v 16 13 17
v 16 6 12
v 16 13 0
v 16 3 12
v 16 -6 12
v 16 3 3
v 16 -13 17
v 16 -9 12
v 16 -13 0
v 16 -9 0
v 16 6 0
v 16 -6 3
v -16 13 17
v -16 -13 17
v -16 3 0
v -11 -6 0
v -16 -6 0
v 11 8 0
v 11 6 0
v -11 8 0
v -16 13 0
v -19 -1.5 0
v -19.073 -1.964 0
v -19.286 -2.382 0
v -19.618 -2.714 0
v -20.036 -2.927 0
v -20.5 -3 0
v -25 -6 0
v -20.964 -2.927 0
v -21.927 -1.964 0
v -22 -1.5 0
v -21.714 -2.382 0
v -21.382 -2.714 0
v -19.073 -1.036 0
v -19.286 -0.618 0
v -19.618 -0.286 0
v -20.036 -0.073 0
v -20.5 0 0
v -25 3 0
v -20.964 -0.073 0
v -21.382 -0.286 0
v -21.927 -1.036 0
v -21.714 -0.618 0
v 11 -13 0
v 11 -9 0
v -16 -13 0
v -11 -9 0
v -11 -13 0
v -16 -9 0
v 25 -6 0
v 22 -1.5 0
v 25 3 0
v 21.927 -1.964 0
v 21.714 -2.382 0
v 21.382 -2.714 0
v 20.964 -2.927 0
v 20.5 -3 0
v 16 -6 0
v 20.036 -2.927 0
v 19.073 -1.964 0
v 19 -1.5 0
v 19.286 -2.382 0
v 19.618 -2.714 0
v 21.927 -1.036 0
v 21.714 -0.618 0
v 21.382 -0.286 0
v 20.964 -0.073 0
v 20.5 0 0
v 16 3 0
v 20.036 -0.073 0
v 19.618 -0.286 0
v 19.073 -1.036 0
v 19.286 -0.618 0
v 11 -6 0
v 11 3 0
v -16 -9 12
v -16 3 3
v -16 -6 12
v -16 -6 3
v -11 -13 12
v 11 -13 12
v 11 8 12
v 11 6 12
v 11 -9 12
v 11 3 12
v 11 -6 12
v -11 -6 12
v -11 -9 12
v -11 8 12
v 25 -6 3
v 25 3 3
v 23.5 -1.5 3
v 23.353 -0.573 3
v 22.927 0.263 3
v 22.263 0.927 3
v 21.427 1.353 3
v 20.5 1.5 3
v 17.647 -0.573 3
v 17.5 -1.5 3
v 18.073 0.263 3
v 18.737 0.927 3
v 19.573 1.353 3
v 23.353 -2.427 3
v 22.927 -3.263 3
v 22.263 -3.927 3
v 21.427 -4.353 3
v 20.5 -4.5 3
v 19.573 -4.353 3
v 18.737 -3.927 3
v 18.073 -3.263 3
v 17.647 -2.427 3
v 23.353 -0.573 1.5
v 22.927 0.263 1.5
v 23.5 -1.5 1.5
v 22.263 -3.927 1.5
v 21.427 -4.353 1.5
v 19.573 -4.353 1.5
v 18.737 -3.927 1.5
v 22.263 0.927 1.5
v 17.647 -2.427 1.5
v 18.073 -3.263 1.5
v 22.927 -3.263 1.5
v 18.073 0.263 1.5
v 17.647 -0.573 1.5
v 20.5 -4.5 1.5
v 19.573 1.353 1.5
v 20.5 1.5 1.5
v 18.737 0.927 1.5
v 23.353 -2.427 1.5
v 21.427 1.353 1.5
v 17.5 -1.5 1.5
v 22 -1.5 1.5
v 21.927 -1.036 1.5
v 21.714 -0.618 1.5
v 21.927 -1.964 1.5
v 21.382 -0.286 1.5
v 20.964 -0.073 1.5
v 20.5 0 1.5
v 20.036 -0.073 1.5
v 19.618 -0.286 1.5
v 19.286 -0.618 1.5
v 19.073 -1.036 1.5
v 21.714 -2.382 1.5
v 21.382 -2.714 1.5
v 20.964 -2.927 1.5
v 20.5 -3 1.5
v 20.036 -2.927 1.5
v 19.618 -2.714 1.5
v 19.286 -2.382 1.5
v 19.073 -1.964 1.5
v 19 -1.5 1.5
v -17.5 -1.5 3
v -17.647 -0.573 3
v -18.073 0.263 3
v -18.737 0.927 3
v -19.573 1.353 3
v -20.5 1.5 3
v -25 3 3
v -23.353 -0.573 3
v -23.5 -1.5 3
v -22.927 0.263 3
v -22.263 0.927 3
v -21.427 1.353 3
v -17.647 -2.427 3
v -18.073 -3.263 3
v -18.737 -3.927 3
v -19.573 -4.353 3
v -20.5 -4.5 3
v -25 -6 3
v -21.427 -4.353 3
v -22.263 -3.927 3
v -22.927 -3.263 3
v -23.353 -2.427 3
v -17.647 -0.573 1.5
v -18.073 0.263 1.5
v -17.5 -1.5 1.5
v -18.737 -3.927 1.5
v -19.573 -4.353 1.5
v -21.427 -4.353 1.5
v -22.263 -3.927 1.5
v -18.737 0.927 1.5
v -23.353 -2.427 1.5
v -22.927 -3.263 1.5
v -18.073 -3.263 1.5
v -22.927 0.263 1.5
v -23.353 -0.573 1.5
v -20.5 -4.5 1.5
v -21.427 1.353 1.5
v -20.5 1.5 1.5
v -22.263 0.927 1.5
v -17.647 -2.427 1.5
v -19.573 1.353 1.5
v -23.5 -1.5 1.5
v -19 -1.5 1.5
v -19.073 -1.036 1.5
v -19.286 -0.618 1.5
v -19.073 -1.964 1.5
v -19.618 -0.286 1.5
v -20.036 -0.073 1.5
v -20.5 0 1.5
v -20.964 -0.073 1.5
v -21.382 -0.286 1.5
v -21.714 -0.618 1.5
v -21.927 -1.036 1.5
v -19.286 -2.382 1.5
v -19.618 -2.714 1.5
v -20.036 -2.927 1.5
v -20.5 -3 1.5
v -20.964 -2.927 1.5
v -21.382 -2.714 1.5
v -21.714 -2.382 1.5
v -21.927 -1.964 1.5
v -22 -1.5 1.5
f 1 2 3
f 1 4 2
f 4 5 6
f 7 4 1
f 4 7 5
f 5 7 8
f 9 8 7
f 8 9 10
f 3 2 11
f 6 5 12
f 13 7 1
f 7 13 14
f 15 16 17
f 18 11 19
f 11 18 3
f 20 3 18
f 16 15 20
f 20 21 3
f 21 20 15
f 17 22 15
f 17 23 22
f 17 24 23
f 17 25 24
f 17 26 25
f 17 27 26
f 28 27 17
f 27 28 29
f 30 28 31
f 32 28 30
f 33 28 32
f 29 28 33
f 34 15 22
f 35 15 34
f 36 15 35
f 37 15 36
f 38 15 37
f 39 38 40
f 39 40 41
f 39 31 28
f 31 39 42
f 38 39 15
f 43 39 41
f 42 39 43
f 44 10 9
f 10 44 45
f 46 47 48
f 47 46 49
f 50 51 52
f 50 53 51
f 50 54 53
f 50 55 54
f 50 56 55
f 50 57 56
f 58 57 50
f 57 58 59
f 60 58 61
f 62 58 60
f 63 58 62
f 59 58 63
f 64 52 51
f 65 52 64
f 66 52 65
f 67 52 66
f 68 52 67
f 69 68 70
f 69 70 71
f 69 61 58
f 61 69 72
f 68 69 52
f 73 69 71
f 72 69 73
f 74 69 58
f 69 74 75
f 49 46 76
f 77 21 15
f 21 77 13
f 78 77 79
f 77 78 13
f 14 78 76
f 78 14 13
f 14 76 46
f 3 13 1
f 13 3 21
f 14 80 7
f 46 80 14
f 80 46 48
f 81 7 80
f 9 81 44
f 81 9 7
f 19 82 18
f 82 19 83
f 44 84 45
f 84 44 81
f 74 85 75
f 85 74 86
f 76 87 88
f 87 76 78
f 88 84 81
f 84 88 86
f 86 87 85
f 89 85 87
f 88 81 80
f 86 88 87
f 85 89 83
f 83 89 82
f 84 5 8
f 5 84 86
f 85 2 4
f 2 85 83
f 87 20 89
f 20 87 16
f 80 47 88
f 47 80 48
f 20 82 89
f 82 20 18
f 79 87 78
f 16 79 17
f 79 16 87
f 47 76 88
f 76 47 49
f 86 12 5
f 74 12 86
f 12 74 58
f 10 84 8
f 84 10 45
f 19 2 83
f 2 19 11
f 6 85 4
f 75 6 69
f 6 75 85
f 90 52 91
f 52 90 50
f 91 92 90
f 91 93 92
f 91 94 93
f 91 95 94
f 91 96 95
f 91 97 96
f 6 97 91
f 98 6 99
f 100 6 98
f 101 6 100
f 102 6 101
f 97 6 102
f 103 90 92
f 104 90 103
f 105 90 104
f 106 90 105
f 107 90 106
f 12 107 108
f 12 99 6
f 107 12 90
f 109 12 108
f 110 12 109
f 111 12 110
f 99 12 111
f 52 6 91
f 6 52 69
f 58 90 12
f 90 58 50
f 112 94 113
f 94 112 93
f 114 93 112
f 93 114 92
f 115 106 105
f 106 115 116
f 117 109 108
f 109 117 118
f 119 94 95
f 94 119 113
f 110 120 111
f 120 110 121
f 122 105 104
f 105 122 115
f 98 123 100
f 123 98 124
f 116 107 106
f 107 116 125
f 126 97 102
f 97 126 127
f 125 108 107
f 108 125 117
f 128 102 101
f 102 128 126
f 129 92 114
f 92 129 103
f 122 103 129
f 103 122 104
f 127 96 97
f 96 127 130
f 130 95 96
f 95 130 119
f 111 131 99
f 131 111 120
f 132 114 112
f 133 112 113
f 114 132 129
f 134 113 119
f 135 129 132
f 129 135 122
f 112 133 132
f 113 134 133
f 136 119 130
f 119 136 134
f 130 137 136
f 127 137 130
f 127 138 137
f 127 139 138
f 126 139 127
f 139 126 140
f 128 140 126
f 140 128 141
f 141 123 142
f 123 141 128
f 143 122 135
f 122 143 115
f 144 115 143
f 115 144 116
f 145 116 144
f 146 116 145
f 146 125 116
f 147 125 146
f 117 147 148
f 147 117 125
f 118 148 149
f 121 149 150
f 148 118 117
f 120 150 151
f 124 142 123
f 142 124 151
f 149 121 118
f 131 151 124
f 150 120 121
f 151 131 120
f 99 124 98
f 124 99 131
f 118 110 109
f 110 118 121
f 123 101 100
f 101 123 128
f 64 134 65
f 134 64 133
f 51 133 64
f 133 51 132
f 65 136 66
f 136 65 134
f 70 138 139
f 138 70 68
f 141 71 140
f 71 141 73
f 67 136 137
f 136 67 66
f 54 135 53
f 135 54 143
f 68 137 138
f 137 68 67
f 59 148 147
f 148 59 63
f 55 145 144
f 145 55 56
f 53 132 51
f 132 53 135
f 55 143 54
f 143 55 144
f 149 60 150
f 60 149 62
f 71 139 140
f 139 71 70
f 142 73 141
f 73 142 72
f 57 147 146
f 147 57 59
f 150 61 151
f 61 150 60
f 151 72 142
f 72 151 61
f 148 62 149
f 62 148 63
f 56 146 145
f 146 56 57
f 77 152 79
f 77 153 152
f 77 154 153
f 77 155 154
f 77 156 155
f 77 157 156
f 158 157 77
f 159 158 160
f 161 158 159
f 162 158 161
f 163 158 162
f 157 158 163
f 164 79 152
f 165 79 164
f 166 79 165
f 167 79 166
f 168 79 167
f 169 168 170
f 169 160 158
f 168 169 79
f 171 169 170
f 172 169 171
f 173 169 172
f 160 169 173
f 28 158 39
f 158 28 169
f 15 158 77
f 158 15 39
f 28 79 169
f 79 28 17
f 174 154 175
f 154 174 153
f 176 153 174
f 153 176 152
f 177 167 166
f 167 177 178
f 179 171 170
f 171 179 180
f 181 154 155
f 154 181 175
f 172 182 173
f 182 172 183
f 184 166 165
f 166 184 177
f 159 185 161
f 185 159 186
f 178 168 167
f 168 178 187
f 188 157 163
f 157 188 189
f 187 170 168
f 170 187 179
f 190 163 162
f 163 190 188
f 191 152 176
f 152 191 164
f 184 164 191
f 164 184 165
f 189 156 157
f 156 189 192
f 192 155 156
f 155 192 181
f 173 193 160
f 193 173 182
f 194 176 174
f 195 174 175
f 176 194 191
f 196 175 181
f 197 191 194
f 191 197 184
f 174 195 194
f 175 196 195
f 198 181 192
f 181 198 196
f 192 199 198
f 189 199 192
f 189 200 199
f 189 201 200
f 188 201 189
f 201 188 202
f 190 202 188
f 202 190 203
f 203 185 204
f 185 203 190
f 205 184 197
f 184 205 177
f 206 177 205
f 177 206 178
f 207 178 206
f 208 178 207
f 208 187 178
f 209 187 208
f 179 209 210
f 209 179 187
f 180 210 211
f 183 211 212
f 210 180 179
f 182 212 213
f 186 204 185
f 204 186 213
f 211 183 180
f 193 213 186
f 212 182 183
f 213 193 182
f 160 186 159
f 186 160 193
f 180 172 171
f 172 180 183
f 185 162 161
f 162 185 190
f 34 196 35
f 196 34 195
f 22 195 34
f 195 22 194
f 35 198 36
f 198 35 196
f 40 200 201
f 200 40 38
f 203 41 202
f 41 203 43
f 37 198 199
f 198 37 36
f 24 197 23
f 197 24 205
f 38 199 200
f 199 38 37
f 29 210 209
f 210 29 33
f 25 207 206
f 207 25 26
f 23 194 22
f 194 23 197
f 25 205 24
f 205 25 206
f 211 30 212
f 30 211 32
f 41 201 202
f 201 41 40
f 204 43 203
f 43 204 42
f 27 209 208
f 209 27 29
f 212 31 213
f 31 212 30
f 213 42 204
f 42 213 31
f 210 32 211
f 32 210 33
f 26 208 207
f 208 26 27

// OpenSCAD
servoClip();

module servoClip(){
	
  heigth = 12;
  width = 22;
  depth = 21;
  buffer = 5;
  
  translate([-(width+2*buffer)/2,-(depth+buffer)/2,0]){
  
    difference(){
  
      cube([width+2*buffer, depth+buffer, heigth+buffer]); 
  
      translate([buffer,0,0]){
        cube([width, depth, heigth]);
      }
        
        
      translate([0,4,0]){
        cube([buffer,3 , heigth]);
      }  
        
      translate([width+buffer,4,0]){
        cube([buffer,3 , heigth]);
      }   
        
      translate([width+buffer,16,0]){
        cube([buffer,3 , heigth]);
      }   
    }  
    
     translate([width+2*buffer,7,0]){
       
        difference(){
       
        cube([9,9,3]);
        
        translate([4.5,4.5,1.5]){
            cylinder(h=1.5, r=3, $fn=20);
          }

          translate([4.5,4.5,0]){
             cylinder(h=3, r=1.5, $fn=20);
          }
        }
    }
    
    translate([-9,7,0]){
       
        difference(){
       
        cube([9,9,3]);
        
        translate([4.5,4.5,1.5]){
          cylinder(h=1.5, r=3, $fn=20);
        }
          
        translate([4.5,4.5,0]){
          cylinder(h=3, r=1.5, $fn=20);
        }
      }  
    }
  }
}
